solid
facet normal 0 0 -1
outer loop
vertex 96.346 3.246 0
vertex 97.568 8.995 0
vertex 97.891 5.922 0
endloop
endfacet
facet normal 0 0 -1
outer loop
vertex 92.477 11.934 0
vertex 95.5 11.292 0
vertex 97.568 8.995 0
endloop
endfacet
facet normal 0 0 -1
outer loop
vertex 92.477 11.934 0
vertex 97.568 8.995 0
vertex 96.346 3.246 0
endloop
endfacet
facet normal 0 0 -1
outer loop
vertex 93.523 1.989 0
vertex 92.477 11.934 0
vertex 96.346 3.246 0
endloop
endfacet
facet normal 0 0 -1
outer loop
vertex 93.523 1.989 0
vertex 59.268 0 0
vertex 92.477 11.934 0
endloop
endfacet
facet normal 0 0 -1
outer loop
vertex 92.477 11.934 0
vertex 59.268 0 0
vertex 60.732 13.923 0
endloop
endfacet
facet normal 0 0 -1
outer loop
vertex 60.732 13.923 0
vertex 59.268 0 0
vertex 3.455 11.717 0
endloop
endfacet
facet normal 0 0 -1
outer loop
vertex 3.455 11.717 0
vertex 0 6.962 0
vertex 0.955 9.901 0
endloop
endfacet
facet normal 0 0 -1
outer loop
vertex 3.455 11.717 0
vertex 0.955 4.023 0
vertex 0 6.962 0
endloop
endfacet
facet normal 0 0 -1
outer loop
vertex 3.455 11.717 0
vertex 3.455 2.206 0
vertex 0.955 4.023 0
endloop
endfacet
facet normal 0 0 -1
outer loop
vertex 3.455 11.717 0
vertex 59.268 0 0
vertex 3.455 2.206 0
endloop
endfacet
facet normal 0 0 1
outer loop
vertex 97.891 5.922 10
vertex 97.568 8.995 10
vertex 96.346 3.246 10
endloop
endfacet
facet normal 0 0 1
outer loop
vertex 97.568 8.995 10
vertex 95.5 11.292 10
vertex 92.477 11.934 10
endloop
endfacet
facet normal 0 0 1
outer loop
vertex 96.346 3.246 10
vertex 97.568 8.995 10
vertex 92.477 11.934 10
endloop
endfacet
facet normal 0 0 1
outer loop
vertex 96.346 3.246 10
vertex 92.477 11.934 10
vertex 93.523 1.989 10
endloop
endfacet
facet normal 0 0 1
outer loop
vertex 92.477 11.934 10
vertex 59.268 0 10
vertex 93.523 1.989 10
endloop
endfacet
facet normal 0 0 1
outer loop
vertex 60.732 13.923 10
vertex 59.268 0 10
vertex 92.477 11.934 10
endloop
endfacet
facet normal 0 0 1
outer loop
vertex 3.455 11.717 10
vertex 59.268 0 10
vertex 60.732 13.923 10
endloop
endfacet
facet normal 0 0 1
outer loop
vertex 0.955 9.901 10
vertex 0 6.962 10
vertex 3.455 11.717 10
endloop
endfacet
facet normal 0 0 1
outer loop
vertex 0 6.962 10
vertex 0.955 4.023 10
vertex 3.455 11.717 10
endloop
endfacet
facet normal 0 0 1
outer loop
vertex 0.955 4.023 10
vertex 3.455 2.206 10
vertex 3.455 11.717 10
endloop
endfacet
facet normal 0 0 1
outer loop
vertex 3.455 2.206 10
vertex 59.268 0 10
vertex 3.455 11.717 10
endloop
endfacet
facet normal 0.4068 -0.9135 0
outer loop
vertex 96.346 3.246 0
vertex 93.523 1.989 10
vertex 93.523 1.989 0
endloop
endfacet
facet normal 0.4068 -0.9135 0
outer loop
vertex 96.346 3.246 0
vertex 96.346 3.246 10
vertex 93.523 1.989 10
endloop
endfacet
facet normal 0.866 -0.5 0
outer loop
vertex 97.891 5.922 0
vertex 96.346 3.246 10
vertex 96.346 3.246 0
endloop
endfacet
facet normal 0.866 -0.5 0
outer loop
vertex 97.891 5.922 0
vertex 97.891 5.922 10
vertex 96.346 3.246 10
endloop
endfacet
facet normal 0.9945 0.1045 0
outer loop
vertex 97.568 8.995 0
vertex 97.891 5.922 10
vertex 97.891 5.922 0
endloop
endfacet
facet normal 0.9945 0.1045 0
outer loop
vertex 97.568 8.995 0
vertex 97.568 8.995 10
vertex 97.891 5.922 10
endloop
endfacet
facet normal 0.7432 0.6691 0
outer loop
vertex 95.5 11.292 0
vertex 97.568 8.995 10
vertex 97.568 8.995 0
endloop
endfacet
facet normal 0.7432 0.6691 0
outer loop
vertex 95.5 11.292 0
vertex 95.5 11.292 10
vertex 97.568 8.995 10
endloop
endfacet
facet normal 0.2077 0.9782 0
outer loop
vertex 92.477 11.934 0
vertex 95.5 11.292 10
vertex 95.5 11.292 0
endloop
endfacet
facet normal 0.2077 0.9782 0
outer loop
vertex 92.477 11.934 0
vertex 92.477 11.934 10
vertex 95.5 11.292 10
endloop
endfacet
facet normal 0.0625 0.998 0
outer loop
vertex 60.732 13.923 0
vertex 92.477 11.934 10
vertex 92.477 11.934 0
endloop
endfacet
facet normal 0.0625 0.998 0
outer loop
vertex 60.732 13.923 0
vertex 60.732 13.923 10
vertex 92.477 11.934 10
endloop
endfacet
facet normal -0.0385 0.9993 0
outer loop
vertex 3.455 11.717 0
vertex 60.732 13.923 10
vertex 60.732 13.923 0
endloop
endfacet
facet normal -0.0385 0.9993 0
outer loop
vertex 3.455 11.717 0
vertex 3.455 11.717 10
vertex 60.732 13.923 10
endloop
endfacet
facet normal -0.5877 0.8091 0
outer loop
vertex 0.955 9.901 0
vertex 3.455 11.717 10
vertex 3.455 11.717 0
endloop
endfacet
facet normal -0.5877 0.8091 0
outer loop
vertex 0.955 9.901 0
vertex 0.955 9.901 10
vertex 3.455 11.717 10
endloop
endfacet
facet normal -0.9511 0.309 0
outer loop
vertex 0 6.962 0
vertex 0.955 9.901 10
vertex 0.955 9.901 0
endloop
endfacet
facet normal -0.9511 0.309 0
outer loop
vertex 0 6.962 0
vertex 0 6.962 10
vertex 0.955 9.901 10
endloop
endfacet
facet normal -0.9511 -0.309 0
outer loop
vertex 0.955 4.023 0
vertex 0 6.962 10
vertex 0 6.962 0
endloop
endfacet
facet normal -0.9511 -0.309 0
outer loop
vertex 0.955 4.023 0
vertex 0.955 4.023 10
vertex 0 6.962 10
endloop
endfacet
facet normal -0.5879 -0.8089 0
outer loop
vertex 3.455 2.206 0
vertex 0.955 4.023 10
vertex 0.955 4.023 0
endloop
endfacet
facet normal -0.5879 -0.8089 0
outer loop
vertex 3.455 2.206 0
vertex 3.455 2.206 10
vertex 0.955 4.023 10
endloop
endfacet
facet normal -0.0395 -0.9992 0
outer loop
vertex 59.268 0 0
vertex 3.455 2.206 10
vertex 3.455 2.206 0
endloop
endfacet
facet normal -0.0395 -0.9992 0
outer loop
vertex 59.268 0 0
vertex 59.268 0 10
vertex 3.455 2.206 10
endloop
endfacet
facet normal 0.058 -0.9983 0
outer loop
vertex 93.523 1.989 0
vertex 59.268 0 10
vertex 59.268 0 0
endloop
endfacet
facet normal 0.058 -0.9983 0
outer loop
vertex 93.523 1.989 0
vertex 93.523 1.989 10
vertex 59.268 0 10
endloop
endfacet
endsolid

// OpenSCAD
$fn = 32;

// ----------------------------------------------------------------------
// Lever arm: two bosses 10 and 14 mm, 55 mm between centres
// ----------------------------------------------------------------------

// --- parameters (mm) ---
profile_height = 10;      // extrusion height
profile_points = 13;      // points of the closed outline

profile = [[0, 6.962], [0.955, 4.023], [3.455, 2.206], [59.268, 0], [93.523, 1.989], [96.346, 3.246], [97.891, 5.922], [97.568, 8.995], [95.5, 11.292], [92.477, 11.934], [60.732, 13.923], [3.455, 11.717], [0.955, 9.901]];  // single closed polygon, 13 points, counter clockwise

// --- the one profile operation ---
linear_extrude(height = profile_height) polygon(points = profile);
